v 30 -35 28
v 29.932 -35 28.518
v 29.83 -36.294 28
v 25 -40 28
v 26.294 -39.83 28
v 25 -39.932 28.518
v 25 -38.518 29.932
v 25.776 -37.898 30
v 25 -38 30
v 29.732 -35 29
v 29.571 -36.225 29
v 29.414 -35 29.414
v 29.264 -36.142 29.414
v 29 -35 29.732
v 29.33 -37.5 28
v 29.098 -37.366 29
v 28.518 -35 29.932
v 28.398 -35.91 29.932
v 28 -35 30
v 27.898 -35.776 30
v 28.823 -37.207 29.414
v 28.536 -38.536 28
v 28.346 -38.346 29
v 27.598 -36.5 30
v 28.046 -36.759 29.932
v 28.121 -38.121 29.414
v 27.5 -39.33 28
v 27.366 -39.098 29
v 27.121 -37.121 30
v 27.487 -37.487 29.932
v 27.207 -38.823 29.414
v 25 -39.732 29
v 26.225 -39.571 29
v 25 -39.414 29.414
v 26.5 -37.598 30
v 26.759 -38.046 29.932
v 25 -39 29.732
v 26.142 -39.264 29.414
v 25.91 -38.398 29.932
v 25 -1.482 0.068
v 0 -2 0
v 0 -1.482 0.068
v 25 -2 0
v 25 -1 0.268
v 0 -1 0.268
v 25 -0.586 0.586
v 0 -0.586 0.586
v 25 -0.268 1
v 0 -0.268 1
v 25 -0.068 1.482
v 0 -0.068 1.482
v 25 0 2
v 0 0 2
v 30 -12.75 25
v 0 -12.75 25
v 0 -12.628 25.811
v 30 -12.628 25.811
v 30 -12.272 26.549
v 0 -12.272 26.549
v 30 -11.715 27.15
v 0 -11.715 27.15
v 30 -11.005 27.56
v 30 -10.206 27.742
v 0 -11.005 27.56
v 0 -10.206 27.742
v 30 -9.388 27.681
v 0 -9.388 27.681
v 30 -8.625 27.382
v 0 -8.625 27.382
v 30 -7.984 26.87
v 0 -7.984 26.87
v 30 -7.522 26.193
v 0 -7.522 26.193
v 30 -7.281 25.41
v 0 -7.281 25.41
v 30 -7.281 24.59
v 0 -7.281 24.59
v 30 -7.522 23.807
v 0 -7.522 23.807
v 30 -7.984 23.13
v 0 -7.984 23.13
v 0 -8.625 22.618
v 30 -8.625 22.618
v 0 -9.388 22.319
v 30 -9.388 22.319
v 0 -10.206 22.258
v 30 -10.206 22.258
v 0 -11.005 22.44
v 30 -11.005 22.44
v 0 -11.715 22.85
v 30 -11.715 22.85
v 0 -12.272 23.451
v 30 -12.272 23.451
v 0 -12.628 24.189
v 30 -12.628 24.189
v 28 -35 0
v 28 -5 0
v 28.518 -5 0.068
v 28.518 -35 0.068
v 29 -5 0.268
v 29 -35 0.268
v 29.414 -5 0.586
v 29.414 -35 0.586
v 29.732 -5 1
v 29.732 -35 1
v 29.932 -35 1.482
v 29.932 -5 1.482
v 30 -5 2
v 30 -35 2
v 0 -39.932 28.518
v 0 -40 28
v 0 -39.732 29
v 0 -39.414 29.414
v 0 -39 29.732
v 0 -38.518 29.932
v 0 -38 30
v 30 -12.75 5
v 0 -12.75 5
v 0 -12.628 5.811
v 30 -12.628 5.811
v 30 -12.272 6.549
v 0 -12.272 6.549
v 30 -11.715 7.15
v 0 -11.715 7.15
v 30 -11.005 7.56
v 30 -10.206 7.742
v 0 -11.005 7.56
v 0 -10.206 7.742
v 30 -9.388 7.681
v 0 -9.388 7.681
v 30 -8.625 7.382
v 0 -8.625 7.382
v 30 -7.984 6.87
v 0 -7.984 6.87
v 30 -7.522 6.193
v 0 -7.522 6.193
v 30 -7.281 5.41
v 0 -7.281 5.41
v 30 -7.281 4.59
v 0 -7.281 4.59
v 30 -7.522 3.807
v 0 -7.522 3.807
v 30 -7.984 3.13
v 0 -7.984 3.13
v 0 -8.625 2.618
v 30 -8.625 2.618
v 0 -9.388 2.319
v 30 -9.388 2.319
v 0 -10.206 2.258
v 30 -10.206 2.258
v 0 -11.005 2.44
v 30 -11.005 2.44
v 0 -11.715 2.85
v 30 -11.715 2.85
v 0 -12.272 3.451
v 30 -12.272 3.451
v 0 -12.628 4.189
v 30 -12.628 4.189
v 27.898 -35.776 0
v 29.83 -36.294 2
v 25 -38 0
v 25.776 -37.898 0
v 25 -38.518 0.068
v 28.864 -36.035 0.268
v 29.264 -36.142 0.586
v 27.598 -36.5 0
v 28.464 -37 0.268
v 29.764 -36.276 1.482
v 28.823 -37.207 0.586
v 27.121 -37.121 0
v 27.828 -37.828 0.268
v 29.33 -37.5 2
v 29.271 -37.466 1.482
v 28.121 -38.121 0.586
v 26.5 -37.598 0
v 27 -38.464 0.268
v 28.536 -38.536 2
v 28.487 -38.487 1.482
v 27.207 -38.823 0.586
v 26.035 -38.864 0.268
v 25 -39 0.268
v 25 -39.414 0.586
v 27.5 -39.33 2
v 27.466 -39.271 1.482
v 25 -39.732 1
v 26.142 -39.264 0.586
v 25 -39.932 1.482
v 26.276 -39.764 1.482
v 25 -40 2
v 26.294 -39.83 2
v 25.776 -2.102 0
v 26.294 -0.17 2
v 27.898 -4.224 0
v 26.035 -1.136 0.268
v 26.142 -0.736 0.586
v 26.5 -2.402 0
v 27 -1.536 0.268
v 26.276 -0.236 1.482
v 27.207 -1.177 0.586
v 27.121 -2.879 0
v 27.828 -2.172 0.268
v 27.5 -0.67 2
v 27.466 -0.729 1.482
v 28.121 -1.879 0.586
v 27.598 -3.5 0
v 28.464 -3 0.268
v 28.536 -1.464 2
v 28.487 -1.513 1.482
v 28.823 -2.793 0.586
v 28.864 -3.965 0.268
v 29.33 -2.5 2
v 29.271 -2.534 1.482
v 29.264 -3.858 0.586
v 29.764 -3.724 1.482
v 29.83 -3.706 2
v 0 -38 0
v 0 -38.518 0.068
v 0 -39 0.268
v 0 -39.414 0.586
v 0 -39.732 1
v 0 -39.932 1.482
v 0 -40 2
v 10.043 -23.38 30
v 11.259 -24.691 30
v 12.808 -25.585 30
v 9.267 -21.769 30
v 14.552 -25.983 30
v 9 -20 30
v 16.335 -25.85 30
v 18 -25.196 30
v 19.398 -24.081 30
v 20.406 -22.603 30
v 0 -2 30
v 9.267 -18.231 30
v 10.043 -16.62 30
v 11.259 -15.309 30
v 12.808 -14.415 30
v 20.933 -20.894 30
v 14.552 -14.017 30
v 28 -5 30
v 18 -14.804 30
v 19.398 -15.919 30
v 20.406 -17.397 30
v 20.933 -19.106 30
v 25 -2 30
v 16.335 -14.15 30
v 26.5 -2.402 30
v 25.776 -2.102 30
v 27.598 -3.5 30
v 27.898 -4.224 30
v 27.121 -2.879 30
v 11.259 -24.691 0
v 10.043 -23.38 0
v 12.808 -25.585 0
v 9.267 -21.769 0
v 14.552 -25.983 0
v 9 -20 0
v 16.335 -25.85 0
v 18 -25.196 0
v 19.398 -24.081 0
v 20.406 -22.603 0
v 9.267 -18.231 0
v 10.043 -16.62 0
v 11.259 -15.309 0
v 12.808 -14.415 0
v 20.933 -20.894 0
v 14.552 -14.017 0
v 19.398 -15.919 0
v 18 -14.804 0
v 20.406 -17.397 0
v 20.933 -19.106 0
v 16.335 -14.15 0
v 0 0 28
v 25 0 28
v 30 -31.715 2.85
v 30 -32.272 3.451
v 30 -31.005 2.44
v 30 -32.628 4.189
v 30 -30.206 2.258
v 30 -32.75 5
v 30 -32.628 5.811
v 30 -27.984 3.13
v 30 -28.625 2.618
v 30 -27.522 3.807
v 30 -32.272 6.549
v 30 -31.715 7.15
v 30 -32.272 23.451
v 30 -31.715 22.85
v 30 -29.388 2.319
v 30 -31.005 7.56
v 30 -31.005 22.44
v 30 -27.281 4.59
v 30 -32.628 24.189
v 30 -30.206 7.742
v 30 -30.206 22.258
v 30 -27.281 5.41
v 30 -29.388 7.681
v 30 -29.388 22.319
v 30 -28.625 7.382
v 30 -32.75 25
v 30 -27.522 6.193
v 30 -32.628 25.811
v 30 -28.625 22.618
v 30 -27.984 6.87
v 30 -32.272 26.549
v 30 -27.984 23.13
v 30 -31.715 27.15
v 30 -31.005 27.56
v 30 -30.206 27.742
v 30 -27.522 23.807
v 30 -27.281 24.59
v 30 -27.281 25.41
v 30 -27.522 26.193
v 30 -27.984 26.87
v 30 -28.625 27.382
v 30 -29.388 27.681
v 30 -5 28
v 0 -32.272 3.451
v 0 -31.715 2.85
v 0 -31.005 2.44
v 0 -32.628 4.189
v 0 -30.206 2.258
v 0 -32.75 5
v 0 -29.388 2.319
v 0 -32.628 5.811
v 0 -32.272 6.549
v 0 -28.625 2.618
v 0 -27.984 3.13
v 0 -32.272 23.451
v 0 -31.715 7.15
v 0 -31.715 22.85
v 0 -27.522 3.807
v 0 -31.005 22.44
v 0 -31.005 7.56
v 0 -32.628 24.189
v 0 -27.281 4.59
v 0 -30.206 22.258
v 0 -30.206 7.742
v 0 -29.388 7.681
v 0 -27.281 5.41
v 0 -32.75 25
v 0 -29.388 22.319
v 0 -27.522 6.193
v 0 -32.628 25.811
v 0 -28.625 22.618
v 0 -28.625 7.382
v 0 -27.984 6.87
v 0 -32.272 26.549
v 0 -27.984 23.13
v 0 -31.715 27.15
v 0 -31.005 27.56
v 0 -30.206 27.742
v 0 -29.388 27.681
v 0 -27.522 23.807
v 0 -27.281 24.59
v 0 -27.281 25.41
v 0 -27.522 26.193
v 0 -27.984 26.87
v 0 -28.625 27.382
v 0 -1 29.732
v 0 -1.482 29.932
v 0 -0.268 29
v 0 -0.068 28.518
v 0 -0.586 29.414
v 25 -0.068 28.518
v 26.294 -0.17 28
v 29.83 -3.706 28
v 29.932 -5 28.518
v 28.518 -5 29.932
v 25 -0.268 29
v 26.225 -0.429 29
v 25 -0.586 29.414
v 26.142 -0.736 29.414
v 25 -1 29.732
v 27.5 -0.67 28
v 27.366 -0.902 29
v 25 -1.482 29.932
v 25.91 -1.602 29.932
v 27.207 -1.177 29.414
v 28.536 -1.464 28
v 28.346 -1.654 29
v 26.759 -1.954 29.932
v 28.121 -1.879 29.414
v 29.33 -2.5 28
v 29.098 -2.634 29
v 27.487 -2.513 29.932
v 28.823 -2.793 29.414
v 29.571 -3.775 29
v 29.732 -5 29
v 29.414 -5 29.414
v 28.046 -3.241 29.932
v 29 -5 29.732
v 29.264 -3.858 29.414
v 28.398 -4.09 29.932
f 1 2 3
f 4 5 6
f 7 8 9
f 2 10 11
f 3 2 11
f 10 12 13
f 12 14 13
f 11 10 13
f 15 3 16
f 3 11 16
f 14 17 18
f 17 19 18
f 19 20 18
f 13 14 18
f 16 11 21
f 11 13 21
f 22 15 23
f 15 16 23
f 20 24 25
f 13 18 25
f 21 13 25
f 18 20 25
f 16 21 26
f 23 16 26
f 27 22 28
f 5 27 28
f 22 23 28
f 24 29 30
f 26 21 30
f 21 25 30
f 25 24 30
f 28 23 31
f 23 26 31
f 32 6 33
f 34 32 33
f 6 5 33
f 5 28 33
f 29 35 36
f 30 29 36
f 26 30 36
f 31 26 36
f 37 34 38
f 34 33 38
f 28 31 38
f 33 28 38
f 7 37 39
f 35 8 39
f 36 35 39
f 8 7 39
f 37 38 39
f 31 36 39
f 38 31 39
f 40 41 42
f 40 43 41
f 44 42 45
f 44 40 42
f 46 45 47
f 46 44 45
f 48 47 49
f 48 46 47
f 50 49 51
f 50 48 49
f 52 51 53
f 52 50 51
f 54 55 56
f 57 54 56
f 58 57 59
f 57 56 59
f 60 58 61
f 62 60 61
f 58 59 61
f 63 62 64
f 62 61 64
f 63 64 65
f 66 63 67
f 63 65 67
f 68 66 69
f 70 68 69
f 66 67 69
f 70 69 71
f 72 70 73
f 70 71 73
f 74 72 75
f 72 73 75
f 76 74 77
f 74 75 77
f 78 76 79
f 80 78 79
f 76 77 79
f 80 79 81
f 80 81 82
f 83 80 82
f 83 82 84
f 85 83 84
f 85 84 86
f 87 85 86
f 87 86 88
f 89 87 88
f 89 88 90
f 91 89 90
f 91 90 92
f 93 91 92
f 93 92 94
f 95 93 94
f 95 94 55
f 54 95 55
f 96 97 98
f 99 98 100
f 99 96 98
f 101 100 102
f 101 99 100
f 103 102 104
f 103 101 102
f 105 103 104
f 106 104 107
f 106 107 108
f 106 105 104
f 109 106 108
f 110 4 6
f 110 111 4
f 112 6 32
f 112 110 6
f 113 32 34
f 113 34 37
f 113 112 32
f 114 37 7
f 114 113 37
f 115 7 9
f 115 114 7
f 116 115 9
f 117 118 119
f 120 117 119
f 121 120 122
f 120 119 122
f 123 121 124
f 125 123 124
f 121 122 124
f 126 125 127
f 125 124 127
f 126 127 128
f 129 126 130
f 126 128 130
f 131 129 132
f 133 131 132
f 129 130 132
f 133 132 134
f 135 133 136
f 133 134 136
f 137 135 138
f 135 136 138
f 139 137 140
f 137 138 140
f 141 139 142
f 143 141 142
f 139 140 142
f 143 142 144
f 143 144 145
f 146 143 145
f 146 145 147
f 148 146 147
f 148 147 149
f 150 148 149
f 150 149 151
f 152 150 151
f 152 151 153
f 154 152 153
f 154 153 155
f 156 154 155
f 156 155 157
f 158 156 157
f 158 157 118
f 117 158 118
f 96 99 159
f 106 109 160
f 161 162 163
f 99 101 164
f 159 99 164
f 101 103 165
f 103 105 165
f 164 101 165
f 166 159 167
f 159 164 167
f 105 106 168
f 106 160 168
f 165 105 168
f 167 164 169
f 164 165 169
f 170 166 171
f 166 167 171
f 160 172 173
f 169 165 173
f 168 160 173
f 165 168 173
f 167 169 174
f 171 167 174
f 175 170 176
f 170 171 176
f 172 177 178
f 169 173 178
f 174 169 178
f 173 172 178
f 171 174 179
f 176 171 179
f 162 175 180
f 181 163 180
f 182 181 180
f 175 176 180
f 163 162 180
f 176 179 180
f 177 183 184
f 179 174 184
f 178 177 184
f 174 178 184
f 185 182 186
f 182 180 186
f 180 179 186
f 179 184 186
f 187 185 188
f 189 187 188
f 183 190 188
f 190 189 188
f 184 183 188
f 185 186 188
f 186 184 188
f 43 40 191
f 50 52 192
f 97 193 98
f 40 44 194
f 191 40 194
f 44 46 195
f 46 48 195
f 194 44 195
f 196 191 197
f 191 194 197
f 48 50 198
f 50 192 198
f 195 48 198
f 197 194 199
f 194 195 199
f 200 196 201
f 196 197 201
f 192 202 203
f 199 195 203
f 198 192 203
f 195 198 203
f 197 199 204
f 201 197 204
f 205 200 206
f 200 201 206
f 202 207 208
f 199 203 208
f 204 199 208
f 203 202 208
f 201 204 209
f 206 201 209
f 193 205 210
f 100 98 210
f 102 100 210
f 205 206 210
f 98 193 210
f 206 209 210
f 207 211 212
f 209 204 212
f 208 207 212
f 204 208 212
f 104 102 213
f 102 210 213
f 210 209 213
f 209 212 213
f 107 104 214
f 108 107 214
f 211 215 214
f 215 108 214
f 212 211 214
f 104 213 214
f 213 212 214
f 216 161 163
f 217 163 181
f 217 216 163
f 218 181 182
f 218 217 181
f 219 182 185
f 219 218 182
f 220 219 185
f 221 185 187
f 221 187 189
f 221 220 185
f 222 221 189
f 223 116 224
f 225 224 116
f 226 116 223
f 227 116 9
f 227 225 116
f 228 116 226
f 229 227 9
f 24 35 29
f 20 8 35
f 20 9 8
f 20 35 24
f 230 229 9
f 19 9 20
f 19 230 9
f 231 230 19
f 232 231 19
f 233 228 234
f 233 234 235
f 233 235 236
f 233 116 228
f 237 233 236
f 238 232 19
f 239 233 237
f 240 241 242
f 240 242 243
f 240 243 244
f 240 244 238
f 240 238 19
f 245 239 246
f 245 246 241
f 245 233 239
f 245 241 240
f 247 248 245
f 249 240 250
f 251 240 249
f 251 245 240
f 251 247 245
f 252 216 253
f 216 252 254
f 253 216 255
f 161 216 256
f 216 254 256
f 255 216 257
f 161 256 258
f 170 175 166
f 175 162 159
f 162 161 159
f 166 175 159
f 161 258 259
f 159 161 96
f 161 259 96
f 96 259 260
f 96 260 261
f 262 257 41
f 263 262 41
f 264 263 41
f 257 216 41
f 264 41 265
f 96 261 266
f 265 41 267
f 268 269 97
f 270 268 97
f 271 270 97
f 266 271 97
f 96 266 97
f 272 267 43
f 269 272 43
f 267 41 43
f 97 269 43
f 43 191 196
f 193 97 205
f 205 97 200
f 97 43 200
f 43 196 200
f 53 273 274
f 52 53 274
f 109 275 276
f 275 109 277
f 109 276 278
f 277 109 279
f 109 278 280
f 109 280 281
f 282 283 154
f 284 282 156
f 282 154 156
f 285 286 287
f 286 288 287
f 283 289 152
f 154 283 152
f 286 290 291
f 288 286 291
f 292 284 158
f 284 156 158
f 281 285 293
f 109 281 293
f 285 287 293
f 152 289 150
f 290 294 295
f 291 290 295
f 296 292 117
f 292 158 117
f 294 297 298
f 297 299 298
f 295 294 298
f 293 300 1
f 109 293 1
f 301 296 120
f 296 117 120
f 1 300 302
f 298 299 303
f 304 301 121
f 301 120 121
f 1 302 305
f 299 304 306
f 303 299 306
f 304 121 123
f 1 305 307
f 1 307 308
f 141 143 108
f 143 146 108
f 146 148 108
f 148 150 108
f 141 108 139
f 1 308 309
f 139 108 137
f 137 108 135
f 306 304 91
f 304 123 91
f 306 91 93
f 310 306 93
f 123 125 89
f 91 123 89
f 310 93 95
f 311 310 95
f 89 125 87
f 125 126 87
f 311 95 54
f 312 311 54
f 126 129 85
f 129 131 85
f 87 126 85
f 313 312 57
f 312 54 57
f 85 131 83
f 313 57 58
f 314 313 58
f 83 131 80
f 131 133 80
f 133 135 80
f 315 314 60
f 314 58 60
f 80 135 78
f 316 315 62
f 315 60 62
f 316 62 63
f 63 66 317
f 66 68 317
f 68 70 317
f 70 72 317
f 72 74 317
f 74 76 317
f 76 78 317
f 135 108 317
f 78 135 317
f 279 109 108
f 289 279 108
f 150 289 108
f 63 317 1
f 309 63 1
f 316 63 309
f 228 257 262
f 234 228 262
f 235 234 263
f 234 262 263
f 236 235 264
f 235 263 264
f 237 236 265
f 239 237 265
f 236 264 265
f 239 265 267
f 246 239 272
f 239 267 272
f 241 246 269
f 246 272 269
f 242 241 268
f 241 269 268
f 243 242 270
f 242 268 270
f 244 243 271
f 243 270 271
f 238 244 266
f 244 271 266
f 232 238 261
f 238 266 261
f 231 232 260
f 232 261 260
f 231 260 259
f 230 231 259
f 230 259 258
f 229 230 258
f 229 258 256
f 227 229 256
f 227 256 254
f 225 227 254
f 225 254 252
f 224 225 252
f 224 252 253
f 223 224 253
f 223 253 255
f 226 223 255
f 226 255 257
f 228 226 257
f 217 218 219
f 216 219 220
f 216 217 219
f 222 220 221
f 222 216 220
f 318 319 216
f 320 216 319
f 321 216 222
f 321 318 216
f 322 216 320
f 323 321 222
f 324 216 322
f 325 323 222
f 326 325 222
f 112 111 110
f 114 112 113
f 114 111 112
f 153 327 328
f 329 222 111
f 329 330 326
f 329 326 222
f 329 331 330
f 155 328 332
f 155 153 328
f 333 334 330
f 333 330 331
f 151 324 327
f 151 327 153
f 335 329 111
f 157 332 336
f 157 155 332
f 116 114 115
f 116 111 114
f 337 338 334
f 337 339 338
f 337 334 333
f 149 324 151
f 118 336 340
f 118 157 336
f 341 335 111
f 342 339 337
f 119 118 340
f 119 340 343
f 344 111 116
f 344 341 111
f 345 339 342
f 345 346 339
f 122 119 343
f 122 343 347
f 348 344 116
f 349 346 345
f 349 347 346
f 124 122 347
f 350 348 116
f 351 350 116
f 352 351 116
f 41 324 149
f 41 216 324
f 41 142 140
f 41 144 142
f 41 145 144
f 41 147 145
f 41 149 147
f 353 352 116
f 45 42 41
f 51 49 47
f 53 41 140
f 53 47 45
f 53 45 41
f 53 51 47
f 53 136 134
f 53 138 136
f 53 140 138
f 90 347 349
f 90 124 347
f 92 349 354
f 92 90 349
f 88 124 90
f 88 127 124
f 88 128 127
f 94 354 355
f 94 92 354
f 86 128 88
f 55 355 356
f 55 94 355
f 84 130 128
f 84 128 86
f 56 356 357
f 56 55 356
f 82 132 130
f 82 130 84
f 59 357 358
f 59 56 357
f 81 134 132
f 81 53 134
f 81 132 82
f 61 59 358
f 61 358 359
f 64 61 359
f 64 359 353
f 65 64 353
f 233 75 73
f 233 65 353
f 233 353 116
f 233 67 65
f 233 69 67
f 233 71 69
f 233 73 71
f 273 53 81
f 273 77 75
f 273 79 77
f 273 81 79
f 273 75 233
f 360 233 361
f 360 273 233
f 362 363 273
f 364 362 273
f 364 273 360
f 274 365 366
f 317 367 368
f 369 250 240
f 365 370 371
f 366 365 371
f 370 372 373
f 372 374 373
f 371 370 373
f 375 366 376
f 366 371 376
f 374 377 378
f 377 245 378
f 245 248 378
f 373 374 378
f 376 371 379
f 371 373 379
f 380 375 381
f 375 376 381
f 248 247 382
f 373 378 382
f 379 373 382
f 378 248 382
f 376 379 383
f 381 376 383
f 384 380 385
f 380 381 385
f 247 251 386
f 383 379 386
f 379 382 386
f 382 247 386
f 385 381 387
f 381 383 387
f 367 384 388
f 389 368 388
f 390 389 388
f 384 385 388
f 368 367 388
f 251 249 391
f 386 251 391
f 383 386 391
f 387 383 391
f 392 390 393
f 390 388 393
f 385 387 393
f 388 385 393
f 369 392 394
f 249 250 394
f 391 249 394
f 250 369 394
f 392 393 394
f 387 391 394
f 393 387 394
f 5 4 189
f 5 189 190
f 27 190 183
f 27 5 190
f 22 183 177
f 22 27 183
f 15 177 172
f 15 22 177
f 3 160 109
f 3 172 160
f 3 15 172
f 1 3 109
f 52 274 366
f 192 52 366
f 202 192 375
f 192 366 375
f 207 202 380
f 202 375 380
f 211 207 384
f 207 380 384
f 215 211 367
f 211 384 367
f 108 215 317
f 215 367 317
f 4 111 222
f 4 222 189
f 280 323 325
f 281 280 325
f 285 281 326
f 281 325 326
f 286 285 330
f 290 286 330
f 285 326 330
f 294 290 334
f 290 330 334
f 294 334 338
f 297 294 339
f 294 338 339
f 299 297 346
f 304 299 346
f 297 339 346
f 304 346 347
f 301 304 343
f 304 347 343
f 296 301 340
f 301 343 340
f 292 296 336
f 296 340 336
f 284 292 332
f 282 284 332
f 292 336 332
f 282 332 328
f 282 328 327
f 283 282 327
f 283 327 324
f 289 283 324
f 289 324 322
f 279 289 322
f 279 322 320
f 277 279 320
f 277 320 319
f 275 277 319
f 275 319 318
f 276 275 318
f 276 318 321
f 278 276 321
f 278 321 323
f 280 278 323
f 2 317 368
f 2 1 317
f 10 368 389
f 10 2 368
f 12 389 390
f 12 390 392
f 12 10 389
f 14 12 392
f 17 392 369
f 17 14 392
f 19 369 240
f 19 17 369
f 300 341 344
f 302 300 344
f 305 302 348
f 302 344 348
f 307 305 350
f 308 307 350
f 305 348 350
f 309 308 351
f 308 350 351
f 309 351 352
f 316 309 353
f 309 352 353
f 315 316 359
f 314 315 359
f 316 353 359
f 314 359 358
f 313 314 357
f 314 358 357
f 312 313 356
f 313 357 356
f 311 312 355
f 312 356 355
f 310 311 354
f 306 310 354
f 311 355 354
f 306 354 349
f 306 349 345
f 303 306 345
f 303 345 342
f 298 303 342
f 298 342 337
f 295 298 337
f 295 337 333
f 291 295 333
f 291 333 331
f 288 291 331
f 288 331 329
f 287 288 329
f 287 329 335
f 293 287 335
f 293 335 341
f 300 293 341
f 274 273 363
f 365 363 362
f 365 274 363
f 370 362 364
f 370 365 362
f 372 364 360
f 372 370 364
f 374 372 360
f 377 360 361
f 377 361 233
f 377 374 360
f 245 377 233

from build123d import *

# Parameters (mm, degrees)
F0_W     = 30
F0_H     = 30
F1_DEPTH = 40
F3_D     = 12
F5_D     = 5.5
F6_R     = 5
F7_R     = 2


with BuildPart() as f1:
    # F0 (on Front) → F1 (new body)
    with BuildSketch(Plane.XZ):
        with Locations((15, 15)):
            Rectangle(F0_W, F0_H)
    extrude(amount=F1_DEPTH)

    # F3 (through all)
    with Locations(Plane.XY.offset(30)):
        with Locations((15, -20)):
            Hole(F3_D / 2)

    # F5 (through all)
    with Locations(Plane.YZ.offset(30)):
        with Locations((-30, 25), (-10, 25), (-10, 5), (-30, 5)):
            Hole(F5_D / 2)

    # F6
    f6_edges = [f1.edges().sort_by_distance(p)[0] for p in [
        (30, 0, 15),
        (30, -40, 15),
    ]]
    fillet(f6_edges, radius=F6_R)

    # F7
    f7_edges = [f1.edges().sort_by_distance(p)[0] for p in [
        (30, -20, 30),
        (30, -20, 0),
    ]]
    fillet(f7_edges, radius=F7_R)


solid = f1.part
